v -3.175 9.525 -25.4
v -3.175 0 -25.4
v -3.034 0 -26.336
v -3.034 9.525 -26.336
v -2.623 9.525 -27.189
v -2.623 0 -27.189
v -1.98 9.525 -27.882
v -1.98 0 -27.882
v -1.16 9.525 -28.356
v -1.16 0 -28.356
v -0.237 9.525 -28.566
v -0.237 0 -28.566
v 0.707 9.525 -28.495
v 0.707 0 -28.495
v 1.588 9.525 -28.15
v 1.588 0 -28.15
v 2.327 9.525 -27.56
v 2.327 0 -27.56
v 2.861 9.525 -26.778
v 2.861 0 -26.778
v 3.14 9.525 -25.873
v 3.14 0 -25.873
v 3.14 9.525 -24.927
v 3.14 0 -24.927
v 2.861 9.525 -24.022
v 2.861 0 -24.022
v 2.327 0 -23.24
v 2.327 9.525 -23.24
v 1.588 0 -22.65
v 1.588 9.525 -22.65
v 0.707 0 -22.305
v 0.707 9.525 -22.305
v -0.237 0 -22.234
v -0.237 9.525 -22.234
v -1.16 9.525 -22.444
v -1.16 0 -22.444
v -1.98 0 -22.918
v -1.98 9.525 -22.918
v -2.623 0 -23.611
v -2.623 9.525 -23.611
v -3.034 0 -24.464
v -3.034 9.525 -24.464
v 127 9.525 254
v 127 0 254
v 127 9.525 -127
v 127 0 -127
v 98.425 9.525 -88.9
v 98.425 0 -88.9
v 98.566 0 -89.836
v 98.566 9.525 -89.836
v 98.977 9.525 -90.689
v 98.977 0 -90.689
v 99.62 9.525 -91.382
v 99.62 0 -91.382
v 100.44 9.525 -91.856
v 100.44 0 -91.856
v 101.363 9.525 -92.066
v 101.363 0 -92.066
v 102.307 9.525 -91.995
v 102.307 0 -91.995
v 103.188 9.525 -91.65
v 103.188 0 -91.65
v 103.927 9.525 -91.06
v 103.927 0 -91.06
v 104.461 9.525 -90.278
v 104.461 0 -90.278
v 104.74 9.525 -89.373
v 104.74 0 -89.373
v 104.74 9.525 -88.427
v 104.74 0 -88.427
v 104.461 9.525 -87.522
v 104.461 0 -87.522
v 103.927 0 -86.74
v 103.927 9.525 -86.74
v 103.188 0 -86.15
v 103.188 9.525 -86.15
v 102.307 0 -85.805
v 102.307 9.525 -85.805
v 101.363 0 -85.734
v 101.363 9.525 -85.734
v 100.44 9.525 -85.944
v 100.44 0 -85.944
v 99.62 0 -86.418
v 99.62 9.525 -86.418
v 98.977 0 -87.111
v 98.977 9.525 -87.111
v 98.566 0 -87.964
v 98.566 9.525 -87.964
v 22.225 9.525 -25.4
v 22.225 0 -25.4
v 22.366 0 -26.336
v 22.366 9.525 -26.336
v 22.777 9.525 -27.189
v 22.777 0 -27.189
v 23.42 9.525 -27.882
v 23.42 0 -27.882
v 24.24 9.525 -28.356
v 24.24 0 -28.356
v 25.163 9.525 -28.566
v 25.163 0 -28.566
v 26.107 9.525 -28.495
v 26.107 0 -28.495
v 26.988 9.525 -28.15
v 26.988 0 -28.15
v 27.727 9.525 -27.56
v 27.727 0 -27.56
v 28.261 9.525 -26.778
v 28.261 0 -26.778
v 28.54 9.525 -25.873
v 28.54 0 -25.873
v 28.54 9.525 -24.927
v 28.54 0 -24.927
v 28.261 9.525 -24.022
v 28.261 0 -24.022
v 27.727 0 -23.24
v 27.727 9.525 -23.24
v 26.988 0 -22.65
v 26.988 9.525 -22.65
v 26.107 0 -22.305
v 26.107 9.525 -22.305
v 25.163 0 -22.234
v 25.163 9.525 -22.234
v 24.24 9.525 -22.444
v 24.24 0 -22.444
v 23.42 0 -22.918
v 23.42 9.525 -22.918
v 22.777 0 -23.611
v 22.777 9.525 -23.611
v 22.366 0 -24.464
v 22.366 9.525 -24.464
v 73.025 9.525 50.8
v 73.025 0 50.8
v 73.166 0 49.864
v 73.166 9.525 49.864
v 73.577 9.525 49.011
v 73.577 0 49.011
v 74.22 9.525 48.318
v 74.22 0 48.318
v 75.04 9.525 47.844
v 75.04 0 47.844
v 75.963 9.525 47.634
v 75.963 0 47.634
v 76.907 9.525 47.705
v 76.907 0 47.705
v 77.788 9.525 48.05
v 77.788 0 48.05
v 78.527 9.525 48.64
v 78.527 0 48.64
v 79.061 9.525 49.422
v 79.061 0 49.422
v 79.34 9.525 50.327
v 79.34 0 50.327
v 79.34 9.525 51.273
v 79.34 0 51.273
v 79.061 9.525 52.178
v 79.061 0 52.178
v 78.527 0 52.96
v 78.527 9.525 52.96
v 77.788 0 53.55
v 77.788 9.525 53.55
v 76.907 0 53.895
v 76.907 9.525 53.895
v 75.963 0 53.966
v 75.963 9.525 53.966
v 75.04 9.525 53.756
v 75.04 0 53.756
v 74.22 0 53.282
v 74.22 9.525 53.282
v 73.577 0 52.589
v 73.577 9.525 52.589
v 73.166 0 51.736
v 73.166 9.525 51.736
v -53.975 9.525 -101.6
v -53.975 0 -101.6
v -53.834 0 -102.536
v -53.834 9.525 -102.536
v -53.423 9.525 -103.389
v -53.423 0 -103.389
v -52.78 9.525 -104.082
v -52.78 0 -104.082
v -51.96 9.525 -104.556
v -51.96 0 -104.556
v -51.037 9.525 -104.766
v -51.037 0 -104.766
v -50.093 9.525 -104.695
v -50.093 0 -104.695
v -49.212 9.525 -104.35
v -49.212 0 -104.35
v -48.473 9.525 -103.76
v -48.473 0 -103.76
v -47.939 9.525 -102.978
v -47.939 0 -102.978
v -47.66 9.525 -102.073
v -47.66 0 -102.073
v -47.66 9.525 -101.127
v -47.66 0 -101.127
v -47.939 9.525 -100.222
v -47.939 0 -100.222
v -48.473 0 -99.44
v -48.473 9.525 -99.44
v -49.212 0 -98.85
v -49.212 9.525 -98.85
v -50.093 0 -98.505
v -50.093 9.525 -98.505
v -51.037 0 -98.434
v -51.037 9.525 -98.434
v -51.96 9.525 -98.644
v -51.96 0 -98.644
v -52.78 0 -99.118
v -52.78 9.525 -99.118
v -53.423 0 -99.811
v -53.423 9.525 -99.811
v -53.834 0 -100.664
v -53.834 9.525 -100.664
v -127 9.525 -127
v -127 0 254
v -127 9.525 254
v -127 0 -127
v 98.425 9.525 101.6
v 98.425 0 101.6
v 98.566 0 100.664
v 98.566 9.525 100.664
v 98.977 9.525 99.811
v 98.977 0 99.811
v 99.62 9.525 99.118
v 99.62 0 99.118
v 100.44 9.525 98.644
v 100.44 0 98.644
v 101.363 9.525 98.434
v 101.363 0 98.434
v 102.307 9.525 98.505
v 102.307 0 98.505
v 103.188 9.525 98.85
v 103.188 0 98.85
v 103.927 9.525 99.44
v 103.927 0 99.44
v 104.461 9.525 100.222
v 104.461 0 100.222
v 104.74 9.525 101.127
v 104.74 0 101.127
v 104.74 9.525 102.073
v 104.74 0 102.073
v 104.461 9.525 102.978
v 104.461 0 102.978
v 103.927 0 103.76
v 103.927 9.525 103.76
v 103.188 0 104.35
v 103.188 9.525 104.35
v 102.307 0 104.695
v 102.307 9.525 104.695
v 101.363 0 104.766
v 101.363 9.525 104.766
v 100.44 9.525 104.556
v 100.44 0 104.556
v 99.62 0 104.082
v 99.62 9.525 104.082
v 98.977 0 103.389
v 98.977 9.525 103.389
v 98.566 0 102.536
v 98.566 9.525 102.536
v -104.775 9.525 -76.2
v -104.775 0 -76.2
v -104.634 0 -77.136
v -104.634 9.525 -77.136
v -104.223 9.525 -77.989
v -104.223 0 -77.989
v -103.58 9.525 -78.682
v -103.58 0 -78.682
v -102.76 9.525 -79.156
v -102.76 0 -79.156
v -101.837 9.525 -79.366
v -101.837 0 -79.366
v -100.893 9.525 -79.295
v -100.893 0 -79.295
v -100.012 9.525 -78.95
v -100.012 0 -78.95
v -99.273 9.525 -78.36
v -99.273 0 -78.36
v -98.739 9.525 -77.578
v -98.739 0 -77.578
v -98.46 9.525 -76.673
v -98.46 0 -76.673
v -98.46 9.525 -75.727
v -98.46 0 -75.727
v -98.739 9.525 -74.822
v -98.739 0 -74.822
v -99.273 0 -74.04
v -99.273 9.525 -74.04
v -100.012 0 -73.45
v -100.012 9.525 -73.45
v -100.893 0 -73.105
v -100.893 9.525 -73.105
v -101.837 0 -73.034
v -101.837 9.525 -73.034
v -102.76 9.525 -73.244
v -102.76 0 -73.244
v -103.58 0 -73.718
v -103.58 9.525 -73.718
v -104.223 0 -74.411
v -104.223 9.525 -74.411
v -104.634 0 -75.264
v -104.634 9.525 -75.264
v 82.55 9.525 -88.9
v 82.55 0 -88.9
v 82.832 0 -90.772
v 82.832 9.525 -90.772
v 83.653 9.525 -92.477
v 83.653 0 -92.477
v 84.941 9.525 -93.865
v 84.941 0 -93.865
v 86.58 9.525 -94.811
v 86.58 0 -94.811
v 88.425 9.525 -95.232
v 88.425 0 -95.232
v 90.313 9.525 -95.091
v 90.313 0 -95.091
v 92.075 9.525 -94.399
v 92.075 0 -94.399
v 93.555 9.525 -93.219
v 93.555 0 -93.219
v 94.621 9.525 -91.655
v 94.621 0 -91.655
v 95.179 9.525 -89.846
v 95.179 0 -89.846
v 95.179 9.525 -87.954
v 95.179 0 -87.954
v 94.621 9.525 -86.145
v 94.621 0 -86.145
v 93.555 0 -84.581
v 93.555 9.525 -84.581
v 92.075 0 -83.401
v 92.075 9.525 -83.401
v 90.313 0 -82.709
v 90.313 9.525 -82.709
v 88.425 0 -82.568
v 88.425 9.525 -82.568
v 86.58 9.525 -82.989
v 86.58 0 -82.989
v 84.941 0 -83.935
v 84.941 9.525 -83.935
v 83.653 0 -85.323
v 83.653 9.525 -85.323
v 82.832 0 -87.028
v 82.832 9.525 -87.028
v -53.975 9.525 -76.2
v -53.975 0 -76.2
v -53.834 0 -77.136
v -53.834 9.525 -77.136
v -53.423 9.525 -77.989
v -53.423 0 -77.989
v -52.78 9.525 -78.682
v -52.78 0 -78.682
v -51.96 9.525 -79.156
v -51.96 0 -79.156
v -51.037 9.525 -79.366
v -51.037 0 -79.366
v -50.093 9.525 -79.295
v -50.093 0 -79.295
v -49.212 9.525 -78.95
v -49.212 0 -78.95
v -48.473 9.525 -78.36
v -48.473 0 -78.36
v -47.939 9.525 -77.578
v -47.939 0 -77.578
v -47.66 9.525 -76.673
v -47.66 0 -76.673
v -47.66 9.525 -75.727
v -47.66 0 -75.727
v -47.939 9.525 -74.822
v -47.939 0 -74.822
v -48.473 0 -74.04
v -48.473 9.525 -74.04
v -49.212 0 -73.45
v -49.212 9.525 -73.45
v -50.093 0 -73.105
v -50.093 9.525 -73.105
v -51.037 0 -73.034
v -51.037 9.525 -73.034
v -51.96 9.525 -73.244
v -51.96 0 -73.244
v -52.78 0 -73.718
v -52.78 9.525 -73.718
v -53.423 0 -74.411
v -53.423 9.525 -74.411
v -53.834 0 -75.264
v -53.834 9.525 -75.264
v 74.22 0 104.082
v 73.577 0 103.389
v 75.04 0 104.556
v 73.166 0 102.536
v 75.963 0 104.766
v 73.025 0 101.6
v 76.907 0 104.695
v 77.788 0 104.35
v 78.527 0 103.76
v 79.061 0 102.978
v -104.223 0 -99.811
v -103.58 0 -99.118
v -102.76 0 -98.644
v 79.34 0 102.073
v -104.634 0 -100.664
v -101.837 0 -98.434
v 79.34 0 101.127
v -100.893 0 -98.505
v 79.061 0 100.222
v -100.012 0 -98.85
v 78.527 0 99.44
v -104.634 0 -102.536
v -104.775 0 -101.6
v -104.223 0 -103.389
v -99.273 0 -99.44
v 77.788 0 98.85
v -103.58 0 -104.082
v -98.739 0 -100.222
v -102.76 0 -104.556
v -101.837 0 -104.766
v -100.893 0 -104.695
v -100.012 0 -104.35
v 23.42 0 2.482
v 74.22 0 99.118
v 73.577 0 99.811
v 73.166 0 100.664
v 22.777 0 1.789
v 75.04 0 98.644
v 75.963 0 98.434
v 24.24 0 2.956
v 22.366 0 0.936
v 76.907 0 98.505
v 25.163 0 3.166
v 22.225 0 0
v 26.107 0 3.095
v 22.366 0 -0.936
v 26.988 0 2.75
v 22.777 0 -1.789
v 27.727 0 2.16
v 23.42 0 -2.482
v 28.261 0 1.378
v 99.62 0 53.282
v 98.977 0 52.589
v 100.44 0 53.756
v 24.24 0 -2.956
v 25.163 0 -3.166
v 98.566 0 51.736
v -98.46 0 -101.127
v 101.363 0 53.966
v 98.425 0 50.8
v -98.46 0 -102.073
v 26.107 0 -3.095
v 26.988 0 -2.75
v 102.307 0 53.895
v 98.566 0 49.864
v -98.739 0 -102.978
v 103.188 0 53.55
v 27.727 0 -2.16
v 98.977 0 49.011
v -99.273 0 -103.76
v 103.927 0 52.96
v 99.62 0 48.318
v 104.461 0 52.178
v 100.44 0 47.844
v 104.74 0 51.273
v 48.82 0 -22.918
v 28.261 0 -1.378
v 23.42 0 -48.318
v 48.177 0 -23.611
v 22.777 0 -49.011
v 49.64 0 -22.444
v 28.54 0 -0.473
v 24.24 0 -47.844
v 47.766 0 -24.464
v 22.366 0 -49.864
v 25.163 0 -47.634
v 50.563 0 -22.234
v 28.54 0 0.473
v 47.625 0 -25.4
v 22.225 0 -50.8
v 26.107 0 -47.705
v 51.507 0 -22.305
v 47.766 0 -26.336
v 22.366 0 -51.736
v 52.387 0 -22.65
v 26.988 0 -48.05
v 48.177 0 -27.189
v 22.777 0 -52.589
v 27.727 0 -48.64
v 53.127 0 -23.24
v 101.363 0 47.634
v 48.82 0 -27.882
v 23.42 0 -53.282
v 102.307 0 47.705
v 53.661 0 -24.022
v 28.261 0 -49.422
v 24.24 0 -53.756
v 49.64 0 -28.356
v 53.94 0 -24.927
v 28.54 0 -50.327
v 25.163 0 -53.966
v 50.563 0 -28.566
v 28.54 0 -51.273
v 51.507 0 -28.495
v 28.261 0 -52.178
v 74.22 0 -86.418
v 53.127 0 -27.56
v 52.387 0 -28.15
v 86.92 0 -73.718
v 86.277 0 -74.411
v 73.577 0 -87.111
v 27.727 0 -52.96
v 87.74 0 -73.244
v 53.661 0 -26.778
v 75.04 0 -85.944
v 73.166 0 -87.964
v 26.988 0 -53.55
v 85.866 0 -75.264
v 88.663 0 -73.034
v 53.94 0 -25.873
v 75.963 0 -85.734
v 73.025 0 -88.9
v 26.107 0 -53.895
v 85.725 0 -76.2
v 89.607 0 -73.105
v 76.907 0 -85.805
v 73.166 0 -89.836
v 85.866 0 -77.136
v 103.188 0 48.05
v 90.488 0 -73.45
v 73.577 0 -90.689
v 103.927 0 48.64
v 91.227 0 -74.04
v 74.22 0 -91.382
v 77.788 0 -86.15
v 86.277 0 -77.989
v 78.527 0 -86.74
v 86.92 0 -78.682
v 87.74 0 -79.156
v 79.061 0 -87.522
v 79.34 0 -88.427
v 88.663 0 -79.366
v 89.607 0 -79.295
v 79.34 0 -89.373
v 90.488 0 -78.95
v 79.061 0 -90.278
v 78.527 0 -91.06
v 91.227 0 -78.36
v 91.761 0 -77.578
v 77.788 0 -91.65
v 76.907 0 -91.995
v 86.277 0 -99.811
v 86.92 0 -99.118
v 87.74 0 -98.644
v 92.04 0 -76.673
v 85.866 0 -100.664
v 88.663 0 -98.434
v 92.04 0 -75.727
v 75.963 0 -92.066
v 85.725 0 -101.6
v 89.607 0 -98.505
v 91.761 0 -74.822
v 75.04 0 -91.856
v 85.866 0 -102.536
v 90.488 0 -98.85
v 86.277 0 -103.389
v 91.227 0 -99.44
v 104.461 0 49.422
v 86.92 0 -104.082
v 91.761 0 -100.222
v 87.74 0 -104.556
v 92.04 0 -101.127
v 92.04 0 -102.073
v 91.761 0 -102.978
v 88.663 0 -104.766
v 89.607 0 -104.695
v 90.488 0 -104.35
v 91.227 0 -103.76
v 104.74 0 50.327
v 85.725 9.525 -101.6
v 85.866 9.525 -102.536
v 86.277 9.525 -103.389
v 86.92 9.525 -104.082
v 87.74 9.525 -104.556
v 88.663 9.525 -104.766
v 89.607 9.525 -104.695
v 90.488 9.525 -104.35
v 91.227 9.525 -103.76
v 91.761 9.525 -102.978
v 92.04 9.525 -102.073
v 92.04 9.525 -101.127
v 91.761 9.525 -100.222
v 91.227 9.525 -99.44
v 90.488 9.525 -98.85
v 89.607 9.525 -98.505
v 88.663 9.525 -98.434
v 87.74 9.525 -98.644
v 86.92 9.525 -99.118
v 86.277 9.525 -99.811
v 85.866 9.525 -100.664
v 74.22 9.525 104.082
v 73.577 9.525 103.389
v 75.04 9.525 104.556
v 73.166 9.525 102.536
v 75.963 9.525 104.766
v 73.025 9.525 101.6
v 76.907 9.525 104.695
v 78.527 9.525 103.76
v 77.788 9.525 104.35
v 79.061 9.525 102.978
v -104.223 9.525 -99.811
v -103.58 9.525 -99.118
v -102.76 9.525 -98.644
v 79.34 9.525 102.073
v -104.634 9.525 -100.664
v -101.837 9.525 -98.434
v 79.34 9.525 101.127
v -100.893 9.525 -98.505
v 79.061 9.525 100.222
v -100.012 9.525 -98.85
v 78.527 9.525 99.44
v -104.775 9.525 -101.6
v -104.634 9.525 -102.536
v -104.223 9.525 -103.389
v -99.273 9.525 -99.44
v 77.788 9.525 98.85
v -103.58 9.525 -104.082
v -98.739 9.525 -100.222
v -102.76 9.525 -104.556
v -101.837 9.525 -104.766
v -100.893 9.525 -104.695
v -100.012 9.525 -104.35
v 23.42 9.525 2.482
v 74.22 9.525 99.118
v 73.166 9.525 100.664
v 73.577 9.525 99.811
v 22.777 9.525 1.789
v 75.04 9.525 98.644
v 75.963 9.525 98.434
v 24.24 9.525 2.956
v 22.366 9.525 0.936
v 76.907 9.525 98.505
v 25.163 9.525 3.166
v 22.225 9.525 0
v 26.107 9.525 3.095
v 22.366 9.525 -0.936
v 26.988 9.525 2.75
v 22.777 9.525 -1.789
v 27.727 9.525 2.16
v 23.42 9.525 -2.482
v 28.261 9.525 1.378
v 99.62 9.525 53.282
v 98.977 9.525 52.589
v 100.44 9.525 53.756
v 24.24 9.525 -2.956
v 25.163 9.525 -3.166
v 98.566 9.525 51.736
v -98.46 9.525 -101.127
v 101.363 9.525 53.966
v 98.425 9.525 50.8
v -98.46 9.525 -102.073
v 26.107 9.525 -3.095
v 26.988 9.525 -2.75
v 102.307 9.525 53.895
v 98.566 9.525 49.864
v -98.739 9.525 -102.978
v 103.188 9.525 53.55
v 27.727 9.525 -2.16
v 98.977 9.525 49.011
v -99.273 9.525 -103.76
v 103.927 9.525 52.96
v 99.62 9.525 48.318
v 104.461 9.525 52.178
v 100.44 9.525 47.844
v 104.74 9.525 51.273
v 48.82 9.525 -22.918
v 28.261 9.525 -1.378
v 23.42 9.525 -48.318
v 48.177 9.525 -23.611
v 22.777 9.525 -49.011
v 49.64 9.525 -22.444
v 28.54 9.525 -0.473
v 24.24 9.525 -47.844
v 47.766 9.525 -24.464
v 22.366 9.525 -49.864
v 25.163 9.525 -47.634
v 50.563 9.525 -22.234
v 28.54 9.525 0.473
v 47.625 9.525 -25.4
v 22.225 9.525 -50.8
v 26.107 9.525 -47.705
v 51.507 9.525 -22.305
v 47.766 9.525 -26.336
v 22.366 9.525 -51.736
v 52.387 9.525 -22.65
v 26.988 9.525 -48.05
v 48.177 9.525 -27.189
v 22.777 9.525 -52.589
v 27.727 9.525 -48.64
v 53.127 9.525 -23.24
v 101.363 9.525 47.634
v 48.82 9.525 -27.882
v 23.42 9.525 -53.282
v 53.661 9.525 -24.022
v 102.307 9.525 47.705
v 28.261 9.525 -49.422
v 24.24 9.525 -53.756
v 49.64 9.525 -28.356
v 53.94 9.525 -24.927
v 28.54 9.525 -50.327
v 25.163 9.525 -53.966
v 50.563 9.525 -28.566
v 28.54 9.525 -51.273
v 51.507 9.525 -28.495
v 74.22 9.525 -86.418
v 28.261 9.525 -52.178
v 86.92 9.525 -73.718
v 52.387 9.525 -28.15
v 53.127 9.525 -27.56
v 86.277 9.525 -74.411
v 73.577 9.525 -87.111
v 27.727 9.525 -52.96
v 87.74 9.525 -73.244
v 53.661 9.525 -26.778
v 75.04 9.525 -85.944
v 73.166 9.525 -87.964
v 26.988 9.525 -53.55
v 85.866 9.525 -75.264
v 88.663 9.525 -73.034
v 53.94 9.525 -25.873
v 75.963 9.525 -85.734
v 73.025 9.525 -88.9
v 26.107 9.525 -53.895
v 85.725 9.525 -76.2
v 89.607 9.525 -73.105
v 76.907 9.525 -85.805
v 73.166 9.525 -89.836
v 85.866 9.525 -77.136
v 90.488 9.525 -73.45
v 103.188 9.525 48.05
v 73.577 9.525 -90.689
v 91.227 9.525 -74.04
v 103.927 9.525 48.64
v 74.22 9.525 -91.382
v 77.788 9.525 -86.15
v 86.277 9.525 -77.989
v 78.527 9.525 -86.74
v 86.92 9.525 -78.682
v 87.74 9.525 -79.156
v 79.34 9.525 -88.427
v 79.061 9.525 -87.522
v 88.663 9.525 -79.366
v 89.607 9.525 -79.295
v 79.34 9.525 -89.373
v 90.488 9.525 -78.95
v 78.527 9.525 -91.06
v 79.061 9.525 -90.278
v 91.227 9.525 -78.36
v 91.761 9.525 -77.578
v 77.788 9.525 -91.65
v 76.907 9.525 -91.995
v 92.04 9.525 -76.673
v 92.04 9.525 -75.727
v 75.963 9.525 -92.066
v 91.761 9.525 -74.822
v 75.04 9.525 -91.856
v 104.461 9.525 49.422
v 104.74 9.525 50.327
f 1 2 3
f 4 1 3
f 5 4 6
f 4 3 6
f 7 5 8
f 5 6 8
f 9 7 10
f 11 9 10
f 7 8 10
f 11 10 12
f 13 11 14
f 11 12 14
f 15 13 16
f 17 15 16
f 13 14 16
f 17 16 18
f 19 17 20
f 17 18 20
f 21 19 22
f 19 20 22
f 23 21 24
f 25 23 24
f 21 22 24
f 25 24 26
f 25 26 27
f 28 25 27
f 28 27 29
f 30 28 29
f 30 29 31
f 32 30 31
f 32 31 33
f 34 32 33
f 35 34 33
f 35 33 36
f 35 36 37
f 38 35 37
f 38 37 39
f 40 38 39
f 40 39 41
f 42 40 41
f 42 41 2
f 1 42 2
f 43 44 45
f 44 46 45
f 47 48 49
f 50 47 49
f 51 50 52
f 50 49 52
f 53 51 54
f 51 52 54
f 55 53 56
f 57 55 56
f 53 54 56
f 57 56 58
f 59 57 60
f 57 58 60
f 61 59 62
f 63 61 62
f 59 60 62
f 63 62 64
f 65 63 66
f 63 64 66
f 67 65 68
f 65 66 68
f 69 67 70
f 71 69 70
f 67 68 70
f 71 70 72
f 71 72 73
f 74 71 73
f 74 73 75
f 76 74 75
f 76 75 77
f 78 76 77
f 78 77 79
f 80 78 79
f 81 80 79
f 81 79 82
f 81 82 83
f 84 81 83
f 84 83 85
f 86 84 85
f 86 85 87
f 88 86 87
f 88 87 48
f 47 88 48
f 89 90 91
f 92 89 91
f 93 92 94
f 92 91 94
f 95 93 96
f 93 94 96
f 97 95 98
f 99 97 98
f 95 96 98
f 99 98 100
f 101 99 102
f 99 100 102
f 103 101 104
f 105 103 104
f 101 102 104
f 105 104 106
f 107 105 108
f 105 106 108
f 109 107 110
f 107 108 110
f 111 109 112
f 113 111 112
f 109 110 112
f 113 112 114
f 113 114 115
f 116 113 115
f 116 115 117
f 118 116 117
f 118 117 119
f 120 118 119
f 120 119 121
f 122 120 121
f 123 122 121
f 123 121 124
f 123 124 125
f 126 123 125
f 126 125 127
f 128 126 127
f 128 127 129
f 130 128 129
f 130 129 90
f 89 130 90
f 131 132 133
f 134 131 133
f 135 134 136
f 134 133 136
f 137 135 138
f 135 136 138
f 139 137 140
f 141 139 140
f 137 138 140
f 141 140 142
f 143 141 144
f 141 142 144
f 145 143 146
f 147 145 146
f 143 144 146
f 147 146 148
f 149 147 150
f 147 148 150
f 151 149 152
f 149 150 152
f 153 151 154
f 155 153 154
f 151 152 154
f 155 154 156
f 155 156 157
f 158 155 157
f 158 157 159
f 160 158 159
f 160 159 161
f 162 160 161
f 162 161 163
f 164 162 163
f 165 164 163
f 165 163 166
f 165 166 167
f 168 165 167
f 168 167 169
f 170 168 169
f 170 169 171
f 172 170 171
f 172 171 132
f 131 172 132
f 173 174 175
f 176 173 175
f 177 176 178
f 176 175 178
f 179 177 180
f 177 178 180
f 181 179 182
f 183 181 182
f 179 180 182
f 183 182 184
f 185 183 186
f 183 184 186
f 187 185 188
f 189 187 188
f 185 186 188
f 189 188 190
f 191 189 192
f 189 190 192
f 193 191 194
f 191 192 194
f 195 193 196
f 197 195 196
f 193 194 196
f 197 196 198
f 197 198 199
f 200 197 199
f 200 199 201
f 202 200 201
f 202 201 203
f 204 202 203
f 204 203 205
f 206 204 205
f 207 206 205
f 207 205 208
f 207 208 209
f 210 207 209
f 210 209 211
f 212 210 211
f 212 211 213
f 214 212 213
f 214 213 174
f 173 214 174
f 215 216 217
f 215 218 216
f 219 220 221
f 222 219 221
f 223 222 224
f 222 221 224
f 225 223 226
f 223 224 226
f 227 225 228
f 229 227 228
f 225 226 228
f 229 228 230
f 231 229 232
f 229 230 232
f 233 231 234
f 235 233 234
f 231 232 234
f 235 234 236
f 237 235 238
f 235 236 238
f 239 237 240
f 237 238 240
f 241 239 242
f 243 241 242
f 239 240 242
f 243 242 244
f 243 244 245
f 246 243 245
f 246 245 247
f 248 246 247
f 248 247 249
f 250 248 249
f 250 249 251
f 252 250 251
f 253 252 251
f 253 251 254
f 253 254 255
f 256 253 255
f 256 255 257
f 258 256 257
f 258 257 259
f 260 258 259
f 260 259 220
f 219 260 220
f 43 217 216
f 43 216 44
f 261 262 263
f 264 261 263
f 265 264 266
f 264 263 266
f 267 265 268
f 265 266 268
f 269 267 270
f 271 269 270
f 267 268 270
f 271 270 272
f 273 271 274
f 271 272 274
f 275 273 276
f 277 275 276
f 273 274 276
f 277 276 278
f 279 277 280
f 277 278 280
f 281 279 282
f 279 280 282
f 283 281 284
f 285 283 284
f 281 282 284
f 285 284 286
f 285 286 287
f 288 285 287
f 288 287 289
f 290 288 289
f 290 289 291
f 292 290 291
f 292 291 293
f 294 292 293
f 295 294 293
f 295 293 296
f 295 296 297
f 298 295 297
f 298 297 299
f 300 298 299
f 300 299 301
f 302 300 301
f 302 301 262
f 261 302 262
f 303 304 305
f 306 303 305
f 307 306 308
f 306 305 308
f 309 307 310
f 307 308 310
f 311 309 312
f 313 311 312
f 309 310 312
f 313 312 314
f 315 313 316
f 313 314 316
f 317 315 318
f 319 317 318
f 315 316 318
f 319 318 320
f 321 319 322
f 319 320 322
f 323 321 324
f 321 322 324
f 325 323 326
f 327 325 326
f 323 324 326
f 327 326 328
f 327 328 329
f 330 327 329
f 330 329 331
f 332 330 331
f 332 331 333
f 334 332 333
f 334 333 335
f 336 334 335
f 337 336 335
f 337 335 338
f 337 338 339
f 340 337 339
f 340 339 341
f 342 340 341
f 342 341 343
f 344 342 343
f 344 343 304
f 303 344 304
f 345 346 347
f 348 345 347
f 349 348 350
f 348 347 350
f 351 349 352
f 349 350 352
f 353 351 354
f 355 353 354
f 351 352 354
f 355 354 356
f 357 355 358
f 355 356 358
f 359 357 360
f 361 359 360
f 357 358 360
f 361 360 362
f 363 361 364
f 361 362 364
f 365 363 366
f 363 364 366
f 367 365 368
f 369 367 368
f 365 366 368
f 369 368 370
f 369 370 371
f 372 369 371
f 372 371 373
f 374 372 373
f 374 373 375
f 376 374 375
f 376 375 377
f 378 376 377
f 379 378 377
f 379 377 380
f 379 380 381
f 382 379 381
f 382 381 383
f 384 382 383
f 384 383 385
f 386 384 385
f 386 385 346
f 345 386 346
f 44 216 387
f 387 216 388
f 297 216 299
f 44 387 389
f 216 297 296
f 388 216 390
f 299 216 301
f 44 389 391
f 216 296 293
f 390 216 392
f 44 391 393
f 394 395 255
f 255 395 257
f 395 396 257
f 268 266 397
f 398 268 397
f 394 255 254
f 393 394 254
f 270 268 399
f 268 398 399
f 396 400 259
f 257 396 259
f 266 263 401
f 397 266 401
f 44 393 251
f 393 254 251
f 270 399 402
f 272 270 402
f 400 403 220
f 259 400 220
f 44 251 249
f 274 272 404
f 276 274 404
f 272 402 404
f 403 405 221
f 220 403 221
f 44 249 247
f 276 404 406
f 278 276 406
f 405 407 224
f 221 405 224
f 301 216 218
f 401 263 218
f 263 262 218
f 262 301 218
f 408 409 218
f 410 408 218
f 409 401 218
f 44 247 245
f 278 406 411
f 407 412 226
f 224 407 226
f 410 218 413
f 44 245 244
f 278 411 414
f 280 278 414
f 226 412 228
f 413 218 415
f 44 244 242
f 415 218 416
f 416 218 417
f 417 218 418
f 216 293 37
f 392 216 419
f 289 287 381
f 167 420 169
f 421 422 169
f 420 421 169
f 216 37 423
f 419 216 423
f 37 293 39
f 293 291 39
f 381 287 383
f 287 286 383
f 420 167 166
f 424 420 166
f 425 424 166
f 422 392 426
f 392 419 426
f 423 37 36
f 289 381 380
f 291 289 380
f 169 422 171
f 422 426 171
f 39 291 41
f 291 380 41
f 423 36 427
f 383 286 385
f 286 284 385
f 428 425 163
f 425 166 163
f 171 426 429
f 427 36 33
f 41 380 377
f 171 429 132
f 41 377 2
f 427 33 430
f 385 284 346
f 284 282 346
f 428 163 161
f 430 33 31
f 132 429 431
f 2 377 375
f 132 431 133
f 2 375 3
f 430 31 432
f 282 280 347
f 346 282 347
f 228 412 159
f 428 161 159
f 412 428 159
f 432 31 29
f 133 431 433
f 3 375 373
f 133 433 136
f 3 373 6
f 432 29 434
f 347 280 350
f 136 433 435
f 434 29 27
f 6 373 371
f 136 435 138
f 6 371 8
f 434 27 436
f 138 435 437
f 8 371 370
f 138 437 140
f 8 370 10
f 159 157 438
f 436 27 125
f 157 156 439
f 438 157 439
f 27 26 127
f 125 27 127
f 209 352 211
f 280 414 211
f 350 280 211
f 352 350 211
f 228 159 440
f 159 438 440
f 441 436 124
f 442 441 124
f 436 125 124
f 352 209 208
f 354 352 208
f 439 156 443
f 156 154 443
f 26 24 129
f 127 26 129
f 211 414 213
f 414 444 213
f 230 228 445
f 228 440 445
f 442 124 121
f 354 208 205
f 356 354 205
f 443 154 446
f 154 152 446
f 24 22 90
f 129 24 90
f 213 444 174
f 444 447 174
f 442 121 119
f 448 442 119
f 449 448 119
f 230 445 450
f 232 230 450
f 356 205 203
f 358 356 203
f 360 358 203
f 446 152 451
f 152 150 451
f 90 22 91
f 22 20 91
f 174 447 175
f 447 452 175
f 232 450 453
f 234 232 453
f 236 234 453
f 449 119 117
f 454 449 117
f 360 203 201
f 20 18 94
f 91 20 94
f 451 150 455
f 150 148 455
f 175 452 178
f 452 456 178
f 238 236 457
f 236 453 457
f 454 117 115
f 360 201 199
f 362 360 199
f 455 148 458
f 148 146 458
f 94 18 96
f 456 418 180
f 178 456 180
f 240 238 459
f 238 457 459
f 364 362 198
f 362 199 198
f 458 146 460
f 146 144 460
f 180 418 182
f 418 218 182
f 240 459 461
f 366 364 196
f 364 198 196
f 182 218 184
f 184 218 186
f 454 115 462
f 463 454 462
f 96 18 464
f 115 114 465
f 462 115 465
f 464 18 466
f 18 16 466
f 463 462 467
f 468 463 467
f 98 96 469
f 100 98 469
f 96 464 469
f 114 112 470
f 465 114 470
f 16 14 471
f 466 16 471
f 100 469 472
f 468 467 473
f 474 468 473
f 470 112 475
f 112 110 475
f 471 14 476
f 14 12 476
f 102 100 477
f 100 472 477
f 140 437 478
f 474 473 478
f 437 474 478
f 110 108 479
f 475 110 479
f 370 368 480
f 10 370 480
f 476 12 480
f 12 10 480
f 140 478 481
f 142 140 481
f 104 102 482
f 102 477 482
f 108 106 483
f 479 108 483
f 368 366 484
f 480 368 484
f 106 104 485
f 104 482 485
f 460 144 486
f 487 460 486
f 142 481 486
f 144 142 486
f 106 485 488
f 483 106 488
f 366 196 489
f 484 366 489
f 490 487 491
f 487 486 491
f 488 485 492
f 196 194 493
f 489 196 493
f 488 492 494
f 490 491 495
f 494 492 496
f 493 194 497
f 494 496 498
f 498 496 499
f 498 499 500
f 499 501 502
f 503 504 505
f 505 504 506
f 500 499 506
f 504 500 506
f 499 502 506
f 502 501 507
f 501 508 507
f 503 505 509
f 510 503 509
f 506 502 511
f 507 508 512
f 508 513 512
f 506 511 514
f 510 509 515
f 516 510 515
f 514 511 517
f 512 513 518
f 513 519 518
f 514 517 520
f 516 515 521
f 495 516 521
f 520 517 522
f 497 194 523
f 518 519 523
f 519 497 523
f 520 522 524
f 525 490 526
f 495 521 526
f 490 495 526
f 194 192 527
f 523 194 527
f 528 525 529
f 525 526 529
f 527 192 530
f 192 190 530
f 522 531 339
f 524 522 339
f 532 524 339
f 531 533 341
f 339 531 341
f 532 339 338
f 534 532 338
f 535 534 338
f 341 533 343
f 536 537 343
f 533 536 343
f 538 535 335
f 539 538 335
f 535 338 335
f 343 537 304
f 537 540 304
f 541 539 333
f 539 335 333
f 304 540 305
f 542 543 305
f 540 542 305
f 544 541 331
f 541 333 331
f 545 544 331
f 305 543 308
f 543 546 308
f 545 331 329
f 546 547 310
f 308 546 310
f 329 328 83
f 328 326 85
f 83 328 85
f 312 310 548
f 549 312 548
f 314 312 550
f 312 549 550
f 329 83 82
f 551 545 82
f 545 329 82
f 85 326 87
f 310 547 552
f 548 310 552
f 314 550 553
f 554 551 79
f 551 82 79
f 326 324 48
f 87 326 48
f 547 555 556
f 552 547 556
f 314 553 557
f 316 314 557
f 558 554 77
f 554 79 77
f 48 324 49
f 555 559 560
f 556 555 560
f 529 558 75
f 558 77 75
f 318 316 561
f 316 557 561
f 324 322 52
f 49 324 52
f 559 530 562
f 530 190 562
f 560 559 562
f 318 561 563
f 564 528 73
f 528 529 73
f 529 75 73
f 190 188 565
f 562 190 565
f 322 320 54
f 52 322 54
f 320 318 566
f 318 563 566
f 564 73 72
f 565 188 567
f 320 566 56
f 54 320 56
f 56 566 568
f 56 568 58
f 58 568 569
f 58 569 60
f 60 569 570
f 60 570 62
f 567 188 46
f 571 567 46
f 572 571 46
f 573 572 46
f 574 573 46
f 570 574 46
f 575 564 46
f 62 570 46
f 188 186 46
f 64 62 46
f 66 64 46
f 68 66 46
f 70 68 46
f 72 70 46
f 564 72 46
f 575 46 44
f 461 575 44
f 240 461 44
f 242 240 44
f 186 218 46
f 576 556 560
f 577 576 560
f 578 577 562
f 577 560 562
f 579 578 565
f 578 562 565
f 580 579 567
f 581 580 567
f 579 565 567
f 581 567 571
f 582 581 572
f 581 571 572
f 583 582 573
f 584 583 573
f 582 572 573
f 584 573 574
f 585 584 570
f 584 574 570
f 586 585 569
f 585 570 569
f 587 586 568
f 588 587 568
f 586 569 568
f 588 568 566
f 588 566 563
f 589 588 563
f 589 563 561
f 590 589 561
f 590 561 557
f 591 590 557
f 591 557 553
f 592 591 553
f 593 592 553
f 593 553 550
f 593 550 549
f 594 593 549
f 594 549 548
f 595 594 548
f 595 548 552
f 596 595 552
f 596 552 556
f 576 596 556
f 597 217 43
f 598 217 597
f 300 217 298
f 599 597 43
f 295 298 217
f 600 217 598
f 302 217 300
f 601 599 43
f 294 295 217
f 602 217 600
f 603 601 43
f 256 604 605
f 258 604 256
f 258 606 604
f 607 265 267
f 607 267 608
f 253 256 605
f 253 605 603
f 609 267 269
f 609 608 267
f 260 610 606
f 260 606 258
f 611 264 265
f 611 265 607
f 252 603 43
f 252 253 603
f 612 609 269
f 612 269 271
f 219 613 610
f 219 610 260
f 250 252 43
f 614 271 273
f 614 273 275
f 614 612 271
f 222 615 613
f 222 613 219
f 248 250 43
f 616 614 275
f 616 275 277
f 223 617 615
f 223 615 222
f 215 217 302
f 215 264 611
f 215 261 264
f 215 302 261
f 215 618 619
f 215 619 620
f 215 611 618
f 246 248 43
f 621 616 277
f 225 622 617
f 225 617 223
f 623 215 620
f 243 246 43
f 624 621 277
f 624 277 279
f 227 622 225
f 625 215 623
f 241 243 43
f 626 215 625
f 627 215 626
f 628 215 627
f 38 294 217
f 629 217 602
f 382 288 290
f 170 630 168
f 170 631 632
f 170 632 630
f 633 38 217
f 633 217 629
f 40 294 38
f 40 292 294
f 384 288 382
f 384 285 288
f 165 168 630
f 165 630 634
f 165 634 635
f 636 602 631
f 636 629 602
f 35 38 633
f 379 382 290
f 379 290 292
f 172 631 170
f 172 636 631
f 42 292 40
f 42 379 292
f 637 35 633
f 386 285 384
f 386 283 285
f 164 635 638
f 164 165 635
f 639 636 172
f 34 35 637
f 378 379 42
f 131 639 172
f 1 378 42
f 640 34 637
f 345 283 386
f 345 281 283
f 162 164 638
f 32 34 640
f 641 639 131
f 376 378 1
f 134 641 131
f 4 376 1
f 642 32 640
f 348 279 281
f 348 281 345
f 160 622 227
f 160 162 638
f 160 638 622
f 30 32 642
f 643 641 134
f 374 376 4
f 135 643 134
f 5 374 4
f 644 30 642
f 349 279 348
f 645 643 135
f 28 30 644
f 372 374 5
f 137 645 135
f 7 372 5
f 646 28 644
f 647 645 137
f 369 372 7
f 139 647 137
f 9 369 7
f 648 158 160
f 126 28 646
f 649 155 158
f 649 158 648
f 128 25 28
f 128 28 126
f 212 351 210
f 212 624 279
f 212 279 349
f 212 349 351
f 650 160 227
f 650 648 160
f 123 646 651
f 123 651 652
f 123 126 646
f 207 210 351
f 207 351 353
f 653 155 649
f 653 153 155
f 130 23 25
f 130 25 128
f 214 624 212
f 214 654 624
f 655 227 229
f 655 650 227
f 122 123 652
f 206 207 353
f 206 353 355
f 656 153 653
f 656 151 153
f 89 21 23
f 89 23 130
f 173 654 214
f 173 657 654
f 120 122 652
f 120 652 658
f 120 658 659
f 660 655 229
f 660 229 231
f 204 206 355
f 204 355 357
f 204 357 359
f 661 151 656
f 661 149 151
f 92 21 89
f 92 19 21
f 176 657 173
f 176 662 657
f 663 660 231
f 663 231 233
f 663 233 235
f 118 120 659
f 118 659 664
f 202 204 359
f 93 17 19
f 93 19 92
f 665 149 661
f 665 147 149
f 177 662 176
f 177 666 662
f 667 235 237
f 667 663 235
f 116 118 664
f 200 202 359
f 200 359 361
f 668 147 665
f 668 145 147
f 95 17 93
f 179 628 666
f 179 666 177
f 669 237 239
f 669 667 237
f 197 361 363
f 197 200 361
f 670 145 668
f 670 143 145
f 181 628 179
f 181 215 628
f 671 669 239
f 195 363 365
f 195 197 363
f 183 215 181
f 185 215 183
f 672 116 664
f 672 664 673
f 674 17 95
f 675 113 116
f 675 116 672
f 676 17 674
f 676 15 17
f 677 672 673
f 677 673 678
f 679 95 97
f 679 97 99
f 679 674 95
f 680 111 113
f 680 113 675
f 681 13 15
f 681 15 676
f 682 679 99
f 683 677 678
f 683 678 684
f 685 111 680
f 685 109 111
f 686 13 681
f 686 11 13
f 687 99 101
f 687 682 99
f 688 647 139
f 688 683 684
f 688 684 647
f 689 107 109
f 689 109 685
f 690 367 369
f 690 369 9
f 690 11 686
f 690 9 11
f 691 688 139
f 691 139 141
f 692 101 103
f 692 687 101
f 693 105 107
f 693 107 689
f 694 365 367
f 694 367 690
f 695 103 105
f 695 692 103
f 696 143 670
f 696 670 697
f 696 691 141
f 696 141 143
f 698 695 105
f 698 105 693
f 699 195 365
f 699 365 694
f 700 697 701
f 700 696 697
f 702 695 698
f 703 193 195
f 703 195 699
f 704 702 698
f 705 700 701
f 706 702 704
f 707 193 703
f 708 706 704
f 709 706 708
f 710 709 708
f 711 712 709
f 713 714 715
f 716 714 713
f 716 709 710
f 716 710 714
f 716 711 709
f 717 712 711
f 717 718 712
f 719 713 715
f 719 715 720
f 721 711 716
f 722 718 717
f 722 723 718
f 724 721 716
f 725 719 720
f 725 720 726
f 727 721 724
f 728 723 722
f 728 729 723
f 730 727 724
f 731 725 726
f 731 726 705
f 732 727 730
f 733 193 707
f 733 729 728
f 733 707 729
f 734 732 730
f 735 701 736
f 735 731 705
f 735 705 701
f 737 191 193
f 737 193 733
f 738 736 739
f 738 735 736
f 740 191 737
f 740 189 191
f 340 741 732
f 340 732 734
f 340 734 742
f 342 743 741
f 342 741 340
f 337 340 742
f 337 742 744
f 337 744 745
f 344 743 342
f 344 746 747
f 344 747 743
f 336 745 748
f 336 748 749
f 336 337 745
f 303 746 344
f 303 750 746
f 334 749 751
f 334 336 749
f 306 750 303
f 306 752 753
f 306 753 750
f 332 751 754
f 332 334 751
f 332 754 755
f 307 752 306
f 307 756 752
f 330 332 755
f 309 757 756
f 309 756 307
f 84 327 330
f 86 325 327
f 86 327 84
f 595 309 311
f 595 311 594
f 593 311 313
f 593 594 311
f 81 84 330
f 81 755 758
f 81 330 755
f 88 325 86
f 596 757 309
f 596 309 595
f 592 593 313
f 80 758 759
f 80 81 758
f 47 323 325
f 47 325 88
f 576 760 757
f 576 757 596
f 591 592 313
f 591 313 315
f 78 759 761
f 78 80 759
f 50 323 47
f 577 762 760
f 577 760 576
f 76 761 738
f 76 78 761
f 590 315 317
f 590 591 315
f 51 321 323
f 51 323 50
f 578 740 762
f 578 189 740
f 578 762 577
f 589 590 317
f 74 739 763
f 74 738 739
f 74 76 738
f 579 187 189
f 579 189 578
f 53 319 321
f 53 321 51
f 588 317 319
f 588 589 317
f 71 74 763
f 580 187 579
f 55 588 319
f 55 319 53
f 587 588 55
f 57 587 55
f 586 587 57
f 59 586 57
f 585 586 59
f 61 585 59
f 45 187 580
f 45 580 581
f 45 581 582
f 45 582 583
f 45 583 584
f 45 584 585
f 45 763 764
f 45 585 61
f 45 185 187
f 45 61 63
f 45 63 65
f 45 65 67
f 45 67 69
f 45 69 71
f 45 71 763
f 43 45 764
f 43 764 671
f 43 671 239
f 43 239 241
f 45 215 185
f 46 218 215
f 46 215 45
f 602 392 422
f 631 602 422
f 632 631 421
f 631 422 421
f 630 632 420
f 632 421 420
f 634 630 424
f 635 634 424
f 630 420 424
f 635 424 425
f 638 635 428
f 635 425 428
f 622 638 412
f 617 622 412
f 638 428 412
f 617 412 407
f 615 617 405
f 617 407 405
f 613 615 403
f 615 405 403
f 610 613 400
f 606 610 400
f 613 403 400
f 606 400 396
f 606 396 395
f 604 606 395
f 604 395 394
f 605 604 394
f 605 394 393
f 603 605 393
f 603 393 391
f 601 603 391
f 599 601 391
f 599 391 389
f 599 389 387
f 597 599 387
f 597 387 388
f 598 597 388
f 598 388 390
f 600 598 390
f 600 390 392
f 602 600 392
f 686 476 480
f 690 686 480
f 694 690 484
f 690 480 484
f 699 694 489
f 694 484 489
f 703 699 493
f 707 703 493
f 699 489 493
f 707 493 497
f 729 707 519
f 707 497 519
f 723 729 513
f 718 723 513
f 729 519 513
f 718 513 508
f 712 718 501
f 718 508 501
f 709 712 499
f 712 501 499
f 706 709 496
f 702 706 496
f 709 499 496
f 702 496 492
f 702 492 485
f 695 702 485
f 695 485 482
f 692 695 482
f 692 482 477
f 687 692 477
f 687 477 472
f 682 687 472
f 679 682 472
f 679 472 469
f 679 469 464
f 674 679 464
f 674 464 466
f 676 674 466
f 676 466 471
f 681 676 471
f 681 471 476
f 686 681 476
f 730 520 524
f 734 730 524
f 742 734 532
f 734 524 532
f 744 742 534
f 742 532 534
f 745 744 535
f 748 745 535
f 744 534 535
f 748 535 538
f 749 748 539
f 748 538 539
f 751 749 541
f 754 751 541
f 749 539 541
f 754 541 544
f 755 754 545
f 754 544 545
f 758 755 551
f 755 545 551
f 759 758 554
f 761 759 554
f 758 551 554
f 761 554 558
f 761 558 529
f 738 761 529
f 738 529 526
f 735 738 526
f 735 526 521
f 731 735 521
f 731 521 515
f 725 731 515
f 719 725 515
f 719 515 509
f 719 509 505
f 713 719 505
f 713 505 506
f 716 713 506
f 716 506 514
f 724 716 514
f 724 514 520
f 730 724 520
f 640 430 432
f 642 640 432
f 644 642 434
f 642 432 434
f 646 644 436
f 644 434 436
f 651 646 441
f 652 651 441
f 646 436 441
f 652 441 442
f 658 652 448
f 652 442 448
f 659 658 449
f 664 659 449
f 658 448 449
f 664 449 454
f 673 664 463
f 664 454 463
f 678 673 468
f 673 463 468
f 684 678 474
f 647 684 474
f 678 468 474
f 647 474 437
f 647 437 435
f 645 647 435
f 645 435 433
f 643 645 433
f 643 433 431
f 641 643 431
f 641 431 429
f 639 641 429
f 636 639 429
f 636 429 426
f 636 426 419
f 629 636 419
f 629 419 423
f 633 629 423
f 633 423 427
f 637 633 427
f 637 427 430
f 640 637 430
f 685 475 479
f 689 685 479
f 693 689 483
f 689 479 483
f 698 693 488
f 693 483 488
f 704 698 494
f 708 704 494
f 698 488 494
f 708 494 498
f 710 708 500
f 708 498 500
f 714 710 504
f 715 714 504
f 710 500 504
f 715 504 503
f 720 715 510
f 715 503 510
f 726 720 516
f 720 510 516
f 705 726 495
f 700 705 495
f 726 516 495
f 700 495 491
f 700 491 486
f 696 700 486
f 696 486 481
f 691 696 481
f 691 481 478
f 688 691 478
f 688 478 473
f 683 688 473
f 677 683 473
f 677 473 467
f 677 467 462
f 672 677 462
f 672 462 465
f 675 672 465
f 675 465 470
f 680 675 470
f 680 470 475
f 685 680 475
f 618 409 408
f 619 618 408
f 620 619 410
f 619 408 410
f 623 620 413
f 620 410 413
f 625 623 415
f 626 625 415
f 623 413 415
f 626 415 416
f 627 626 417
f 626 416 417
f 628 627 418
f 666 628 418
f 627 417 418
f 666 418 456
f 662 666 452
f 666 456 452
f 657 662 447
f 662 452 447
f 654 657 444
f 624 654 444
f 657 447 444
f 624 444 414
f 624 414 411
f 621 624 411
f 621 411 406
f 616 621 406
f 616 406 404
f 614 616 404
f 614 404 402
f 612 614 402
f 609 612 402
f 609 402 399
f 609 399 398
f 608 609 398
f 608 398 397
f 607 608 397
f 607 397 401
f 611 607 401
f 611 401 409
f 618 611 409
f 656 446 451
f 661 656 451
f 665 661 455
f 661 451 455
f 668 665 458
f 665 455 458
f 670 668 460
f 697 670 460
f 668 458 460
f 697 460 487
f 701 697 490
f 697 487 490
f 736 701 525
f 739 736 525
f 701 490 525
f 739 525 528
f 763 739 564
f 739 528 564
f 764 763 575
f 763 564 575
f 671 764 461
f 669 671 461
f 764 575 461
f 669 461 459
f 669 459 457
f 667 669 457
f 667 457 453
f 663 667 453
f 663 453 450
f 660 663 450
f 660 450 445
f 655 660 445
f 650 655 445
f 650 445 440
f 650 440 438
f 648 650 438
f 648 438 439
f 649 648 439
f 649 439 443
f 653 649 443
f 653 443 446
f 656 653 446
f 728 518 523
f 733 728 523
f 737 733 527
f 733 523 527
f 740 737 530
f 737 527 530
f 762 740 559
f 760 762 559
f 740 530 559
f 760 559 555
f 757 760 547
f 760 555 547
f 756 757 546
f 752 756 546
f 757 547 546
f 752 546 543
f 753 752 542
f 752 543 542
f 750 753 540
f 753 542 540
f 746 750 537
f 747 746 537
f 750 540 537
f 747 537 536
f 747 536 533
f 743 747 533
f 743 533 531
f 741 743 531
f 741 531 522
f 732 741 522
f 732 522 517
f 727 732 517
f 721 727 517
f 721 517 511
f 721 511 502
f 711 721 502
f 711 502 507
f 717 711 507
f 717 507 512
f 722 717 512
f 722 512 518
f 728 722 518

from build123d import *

# Parameters (mm, degrees)
SKETCH1_W                   = 254
SKETCH1_H                   = 254
BOSS_EXTRUDE1_DEPTH         = 9.525
F_1_4_0_25_DIAMETER_HOLE1_D = 6.35
F_1_2_0_5_DIAMETER_HOLE1_D  = 12.7
SKETCH8_W                   = 254
SKETCH8_H                   = 9.525
BOSS_EXTRUDE2_DEPTH         = 127


with BuildPart() as part:
    # Sketch1 → Boss-Extrude1 (new body)
    with BuildSketch(Plane(origin=(0, 0, 0), x_dir=(1, 0, 0), z_dir=(0, 1, 0))):
        Rectangle(SKETCH1_W, SKETCH1_H)
    extrude(amount=BOSS_EXTRUDE1_DEPTH)

    # 1/4 (0.25) Diameter Hole1 (through all)
    with Locations(Plane(origin=(0, 9.525, 0), x_dir=(1, 0, 0), z_dir=(0, 1, 0))):
        with Locations((-50.8, 76.2), (-50.8, 101.6), (76.2, -50.8), (101.6, -50.8), (76.2, -101.6), (101.6, -101.6), (-101.6, 76.2), (-101.6, 101.6), (25.4, 50.8), (50.8, 25.4), (25.4, 0), (0, 25.4), (25.4, 25.4), (88.9, 76.2), (76.2, 88.9), (88.9, 101.6), (101.6, 88.9)):
            Hole(F_1_4_0_25_DIAMETER_HOLE1_D / 2)

    # 1/2 (0.5) Diameter Hole1 (through all)
    with Locations(Plane(origin=(0, 9.525, 0), x_dir=(1, 0, 0), z_dir=(0, 1, 0))):
        with Locations((88.9, 88.9)):
            Hole(F_1_2_0_5_DIAMETER_HOLE1_D / 2)

    # Sketch8 → Boss-Extrude2 (add)
    with BuildSketch(Plane.XY.offset(127)):
        with Locations((0, 4.7625)):
            Rectangle(SKETCH8_W, SKETCH8_H)
    extrude(amount=BOSS_EXTRUDE2_DEPTH)


solid = part.part
